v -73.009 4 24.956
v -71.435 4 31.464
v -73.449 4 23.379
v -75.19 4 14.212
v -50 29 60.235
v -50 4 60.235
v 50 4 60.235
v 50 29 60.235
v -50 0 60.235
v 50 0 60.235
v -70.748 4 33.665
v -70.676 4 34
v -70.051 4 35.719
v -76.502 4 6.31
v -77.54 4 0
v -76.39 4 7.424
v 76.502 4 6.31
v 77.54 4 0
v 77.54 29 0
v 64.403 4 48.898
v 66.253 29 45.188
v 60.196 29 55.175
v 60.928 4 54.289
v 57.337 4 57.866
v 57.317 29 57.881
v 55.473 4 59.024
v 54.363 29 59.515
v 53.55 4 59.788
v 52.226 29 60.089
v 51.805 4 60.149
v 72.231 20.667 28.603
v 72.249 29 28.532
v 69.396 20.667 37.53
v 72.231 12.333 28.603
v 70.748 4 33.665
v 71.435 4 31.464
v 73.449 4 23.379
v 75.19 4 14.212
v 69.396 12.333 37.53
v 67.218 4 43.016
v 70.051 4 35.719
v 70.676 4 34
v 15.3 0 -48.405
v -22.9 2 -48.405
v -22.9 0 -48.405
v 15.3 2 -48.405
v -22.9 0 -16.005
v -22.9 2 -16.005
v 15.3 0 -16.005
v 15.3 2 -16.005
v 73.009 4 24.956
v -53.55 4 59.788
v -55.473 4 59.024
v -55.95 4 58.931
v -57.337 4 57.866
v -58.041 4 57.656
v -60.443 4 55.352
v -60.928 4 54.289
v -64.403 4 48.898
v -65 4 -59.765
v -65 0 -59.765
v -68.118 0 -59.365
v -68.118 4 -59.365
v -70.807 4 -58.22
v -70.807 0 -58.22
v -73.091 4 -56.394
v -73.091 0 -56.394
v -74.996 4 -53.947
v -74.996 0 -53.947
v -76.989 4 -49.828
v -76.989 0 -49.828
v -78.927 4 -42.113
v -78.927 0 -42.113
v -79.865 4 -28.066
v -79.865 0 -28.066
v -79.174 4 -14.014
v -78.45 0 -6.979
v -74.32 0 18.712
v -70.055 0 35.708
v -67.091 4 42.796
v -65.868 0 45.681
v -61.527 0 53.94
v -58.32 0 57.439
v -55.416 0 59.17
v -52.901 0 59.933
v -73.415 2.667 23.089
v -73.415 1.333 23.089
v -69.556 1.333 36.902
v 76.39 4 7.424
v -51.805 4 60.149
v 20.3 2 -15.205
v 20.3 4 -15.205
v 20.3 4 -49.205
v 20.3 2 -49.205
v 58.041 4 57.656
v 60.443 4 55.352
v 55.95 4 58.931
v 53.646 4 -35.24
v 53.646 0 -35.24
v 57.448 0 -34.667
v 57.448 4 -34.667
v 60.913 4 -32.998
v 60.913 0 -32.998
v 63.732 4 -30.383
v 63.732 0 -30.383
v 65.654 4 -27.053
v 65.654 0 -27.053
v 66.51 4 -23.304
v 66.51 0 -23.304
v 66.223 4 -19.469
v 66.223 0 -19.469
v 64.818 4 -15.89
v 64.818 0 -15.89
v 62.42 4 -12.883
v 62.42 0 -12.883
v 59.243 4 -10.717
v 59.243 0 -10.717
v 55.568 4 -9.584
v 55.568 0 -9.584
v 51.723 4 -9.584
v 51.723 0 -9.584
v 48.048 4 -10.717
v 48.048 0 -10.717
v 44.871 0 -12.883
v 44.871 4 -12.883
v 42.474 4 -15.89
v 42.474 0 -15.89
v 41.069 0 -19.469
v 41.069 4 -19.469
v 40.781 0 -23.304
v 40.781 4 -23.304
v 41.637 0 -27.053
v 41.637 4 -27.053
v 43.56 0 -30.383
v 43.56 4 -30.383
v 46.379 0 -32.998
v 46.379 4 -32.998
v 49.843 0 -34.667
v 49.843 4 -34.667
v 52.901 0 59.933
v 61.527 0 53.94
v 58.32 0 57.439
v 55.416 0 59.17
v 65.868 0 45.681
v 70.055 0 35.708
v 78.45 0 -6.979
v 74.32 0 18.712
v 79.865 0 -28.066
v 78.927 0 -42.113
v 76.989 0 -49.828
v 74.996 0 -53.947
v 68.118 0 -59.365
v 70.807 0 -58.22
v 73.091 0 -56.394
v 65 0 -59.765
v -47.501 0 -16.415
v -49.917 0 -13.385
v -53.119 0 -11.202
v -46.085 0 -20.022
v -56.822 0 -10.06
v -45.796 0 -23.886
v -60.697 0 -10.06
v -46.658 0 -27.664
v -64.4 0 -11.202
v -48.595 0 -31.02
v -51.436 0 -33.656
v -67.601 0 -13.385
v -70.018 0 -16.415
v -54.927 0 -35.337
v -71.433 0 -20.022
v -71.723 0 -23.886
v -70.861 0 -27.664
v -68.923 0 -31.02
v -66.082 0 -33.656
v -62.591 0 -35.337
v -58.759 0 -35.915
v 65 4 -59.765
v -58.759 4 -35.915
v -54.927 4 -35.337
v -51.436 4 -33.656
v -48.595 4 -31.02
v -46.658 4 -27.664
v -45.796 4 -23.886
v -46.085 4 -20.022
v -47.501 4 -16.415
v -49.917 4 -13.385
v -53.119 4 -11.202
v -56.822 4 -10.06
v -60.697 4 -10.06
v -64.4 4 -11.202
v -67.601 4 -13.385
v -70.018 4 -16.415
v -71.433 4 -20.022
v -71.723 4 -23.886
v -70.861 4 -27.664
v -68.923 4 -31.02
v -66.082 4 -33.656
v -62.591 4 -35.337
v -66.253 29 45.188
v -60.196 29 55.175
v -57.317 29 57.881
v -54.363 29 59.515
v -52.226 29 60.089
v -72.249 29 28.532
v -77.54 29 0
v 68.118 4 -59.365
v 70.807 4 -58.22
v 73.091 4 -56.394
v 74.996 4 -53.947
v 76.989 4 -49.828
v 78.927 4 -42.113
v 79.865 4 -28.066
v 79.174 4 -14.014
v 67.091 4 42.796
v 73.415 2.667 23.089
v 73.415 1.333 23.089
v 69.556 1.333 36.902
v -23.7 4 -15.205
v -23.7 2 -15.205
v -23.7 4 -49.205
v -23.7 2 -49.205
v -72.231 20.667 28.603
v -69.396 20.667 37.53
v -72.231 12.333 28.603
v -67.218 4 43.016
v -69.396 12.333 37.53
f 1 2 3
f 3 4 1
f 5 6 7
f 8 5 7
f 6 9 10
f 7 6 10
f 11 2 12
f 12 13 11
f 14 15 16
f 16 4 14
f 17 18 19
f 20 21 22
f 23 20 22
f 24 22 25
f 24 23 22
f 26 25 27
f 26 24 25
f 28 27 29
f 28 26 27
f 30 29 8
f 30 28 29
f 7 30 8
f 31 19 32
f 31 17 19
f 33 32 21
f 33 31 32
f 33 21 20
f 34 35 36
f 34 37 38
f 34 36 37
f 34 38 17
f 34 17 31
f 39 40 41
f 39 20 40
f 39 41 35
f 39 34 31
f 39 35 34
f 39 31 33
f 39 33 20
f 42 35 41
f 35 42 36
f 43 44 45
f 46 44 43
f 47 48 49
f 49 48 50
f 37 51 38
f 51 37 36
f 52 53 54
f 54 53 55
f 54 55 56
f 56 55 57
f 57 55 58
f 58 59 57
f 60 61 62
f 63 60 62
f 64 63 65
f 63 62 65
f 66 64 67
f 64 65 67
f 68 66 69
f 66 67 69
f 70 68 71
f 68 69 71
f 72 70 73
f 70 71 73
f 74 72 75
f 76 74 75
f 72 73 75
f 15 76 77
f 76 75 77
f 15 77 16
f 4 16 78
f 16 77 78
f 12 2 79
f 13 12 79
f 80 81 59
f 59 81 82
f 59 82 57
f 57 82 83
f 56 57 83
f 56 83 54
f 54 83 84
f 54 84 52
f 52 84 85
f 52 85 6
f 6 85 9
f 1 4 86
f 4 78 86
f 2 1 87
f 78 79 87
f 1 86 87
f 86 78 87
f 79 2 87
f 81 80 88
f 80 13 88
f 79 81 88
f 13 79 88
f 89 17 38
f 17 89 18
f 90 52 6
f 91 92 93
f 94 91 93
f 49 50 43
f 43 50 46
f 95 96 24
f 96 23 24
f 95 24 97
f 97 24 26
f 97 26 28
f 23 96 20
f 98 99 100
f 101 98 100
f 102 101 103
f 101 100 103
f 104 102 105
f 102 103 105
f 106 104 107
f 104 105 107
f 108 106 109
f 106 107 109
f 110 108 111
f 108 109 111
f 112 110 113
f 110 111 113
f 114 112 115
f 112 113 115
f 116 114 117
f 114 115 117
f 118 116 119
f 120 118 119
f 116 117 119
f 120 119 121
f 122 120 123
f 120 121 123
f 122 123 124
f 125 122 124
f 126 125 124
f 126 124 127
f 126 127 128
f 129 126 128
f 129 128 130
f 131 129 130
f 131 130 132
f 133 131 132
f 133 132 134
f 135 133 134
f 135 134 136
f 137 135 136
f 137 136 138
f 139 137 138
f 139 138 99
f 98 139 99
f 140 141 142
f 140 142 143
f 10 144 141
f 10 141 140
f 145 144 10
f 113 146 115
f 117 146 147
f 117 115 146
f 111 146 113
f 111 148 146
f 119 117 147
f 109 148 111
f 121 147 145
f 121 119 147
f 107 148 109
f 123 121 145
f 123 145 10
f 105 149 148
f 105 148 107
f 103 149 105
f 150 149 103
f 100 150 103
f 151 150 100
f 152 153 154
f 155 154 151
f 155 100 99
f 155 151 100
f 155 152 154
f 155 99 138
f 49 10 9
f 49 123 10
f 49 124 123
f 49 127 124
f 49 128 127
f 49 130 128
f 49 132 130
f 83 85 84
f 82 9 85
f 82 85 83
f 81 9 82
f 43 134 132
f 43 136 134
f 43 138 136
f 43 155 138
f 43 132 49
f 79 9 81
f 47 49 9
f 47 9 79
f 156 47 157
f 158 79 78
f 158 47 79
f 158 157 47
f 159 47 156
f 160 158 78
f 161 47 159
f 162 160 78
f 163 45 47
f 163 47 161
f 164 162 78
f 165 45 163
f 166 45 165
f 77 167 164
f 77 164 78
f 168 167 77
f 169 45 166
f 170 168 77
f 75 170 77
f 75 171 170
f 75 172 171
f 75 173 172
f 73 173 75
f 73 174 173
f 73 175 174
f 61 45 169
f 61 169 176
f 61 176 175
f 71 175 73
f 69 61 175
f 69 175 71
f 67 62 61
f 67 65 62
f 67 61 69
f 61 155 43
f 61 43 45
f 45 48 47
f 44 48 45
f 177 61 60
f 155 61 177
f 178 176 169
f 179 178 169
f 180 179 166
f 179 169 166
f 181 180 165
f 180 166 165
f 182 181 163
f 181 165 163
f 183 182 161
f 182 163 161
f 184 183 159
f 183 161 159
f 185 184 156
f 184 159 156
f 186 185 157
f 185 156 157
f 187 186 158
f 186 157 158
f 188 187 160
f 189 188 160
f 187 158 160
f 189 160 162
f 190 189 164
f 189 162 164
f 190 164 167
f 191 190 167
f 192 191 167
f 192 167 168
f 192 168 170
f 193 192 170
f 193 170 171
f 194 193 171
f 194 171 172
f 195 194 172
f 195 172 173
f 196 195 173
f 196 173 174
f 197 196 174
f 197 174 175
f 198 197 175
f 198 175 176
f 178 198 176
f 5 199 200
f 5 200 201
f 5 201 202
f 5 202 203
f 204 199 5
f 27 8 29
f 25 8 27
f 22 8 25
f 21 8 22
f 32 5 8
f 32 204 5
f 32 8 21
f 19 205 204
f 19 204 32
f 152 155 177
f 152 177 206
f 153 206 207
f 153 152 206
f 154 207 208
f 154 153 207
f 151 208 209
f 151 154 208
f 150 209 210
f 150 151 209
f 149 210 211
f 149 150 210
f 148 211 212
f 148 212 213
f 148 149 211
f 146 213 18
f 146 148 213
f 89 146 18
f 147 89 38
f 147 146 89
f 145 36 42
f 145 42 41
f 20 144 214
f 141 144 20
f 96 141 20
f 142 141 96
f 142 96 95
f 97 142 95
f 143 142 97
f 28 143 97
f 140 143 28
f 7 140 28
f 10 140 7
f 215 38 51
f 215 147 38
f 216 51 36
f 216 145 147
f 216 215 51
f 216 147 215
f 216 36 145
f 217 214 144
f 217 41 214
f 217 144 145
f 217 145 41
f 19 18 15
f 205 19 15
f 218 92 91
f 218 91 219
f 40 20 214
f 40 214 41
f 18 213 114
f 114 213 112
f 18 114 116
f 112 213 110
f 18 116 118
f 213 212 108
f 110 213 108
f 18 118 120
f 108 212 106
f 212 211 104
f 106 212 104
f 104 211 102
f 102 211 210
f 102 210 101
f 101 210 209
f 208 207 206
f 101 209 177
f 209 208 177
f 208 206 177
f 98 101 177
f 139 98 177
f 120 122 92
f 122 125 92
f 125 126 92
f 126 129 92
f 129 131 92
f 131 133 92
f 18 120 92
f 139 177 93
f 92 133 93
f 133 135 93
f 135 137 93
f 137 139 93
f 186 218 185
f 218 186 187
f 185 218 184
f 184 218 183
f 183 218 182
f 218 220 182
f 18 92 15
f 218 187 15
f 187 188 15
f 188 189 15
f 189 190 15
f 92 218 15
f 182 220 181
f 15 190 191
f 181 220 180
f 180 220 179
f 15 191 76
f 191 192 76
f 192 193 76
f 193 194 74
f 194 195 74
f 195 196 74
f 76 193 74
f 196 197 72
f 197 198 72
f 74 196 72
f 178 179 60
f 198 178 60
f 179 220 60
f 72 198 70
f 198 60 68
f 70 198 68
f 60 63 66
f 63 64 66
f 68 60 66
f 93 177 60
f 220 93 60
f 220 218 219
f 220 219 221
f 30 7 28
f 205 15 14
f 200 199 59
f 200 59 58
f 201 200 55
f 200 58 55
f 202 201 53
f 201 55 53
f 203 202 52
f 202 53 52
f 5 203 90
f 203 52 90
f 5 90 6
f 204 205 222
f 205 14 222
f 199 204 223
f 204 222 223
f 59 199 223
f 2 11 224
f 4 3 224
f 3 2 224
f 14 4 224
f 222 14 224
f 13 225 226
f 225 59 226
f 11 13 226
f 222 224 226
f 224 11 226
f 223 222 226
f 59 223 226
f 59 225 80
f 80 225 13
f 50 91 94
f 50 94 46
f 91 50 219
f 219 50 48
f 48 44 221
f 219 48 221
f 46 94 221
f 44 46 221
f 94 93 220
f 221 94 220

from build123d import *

# Parameters (mm, degrees)
BOSS_EXTRUDE1_DEPTH = 4
SKETCH3_R           = 13
SKETCH3_R_2         = 12.900313703
CUT_EXTRUDE2_DEPTH  = 101.11392848
SKETCH6_W           = 44
SKETCH6_H           = 34
CUT_EXTRUDE3_DEPTH  = 2
SKETCH8_W           = 38.2
SKETCH8_H           = 32.4
CUT_EXTRUDE5_DEPTH  = 101.053978808
BOSS_EXTRUDE2_DEPTH = 25


with BuildPart() as part:
    # Sketch1 → Boss-Extrude1 (new body)
    with BuildSketch(Plane(origin=(0, 0, 0), x_dir=(1, 0, 0), z_dir=(0, 1, 0))):
        with BuildLine():
            Line((-65, 59.764729109), (65, 59.764729109))
            add(Edge.make_bspline(
                [(65, 59.764729109), (88.687727136, 59.714491275), (73.42219291, -28.096601178), (64.179090334, -48.980552043), (61.151204198, -60.009930568), (50, -60.235270891)],
                knots=[0, 0, 0, 0, 0.225756085, 0.325756085, 1, 1, 1, 1], degree=3))
            Line((50, -60.235270891), (-50, -60.235270891))
            add(Edge.make_bspline(
                [(-65, 59.764729109), (-88.687727136, 59.714491275), (-73.42219291, -28.096601178), (-64.179090334, -48.980552043), (-61.151204198, -60.009930568), (-50, -60.235270891)],
                knots=[0, 0, 0, 0, 0.225756085, 0.325756085, 1, 1, 1, 1], degree=3))
        make_face()
    extrude(amount=BOSS_EXTRUDE1_DEPTH)

    # Sketch3 → Cut-Extrude2 (cut, through all)
    with BuildSketch(Plane(origin=(0, 0, 0), x_dir=(-1, 0, 0), z_dir=(0, -1, 0))):
        with Locations(Location((58.759229403, 22.914729109, 0), (0, 0, 90))):
            Circle(SKETCH3_R)
        with Locations(Location((-53.645665468, 22.339729109, 0), (0, 0, 90))):
            Circle(SKETCH3_R_2)
    extrude(amount=-CUT_EXTRUDE2_DEPTH, mode=Mode.SUBTRACT)

    # Sketch6 → Cut-Extrude3 (cut)
    with BuildSketch(Plane(origin=(0, 4, 0), x_dir=(-1, 0, 0), z_dir=(0, -1, 0))):
        with Locations((1.7, 32.204729109)):
            Rectangle(SKETCH6_W, SKETCH6_H)
    extrude(amount=CUT_EXTRUDE3_DEPTH, mode=Mode.SUBTRACT)

    # Sketch8 → Cut-Extrude5 (cut, through all)
    with BuildSketch(Plane(origin=(0, 2, 0), x_dir=(1, 0, 0), z_dir=(0, 1, 0))):
        with Locations((-3.8, 32.204729109)):
            Rectangle(SKETCH8_W, SKETCH8_H)
    extrude(amount=-CUT_EXTRUDE5_DEPTH, mode=Mode.SUBTRACT)

    # Sketch10 → Boss-Extrude2 (add)
    with BuildSketch(Plane(origin=(0, 4, 0), x_dir=(1, 0, 0), z_dir=(0, 1, 0))):
        with BuildLine():
            Line((-50, -60.235270891), (50, -60.235270891))
            add(Edge.make_bspline(
                [(77.539616677, 0), (76.411660362, -6.469994077), (73.861455454, -24.631415856), (64.138708574, -53.213722082), (57.430311509, -60.426507103), (50, -60.235270891)],
                knots=[0, 0, 0, 0, 0.260173637, 0.360173637, 1, 1, 1, 1], degree=3))
            Line((77.539616677, 0), (-77.539616677, 0))
            add(Edge.make_bspline(
                [(-77.539616677, 0), (-76.411660362, -6.469994077), (-73.861455454, -24.631415856), (-64.138708574, -53.213722082), (-57.430311509, -60.426507103), (-50, -60.235270891)],
                knots=[0, 0, 0, 0, 0.260173637, 0.360173637, 1, 1, 1, 1], degree=3))
        make_face()
    extrude(amount=BOSS_EXTRUDE2_DEPTH)


solid = part.part
